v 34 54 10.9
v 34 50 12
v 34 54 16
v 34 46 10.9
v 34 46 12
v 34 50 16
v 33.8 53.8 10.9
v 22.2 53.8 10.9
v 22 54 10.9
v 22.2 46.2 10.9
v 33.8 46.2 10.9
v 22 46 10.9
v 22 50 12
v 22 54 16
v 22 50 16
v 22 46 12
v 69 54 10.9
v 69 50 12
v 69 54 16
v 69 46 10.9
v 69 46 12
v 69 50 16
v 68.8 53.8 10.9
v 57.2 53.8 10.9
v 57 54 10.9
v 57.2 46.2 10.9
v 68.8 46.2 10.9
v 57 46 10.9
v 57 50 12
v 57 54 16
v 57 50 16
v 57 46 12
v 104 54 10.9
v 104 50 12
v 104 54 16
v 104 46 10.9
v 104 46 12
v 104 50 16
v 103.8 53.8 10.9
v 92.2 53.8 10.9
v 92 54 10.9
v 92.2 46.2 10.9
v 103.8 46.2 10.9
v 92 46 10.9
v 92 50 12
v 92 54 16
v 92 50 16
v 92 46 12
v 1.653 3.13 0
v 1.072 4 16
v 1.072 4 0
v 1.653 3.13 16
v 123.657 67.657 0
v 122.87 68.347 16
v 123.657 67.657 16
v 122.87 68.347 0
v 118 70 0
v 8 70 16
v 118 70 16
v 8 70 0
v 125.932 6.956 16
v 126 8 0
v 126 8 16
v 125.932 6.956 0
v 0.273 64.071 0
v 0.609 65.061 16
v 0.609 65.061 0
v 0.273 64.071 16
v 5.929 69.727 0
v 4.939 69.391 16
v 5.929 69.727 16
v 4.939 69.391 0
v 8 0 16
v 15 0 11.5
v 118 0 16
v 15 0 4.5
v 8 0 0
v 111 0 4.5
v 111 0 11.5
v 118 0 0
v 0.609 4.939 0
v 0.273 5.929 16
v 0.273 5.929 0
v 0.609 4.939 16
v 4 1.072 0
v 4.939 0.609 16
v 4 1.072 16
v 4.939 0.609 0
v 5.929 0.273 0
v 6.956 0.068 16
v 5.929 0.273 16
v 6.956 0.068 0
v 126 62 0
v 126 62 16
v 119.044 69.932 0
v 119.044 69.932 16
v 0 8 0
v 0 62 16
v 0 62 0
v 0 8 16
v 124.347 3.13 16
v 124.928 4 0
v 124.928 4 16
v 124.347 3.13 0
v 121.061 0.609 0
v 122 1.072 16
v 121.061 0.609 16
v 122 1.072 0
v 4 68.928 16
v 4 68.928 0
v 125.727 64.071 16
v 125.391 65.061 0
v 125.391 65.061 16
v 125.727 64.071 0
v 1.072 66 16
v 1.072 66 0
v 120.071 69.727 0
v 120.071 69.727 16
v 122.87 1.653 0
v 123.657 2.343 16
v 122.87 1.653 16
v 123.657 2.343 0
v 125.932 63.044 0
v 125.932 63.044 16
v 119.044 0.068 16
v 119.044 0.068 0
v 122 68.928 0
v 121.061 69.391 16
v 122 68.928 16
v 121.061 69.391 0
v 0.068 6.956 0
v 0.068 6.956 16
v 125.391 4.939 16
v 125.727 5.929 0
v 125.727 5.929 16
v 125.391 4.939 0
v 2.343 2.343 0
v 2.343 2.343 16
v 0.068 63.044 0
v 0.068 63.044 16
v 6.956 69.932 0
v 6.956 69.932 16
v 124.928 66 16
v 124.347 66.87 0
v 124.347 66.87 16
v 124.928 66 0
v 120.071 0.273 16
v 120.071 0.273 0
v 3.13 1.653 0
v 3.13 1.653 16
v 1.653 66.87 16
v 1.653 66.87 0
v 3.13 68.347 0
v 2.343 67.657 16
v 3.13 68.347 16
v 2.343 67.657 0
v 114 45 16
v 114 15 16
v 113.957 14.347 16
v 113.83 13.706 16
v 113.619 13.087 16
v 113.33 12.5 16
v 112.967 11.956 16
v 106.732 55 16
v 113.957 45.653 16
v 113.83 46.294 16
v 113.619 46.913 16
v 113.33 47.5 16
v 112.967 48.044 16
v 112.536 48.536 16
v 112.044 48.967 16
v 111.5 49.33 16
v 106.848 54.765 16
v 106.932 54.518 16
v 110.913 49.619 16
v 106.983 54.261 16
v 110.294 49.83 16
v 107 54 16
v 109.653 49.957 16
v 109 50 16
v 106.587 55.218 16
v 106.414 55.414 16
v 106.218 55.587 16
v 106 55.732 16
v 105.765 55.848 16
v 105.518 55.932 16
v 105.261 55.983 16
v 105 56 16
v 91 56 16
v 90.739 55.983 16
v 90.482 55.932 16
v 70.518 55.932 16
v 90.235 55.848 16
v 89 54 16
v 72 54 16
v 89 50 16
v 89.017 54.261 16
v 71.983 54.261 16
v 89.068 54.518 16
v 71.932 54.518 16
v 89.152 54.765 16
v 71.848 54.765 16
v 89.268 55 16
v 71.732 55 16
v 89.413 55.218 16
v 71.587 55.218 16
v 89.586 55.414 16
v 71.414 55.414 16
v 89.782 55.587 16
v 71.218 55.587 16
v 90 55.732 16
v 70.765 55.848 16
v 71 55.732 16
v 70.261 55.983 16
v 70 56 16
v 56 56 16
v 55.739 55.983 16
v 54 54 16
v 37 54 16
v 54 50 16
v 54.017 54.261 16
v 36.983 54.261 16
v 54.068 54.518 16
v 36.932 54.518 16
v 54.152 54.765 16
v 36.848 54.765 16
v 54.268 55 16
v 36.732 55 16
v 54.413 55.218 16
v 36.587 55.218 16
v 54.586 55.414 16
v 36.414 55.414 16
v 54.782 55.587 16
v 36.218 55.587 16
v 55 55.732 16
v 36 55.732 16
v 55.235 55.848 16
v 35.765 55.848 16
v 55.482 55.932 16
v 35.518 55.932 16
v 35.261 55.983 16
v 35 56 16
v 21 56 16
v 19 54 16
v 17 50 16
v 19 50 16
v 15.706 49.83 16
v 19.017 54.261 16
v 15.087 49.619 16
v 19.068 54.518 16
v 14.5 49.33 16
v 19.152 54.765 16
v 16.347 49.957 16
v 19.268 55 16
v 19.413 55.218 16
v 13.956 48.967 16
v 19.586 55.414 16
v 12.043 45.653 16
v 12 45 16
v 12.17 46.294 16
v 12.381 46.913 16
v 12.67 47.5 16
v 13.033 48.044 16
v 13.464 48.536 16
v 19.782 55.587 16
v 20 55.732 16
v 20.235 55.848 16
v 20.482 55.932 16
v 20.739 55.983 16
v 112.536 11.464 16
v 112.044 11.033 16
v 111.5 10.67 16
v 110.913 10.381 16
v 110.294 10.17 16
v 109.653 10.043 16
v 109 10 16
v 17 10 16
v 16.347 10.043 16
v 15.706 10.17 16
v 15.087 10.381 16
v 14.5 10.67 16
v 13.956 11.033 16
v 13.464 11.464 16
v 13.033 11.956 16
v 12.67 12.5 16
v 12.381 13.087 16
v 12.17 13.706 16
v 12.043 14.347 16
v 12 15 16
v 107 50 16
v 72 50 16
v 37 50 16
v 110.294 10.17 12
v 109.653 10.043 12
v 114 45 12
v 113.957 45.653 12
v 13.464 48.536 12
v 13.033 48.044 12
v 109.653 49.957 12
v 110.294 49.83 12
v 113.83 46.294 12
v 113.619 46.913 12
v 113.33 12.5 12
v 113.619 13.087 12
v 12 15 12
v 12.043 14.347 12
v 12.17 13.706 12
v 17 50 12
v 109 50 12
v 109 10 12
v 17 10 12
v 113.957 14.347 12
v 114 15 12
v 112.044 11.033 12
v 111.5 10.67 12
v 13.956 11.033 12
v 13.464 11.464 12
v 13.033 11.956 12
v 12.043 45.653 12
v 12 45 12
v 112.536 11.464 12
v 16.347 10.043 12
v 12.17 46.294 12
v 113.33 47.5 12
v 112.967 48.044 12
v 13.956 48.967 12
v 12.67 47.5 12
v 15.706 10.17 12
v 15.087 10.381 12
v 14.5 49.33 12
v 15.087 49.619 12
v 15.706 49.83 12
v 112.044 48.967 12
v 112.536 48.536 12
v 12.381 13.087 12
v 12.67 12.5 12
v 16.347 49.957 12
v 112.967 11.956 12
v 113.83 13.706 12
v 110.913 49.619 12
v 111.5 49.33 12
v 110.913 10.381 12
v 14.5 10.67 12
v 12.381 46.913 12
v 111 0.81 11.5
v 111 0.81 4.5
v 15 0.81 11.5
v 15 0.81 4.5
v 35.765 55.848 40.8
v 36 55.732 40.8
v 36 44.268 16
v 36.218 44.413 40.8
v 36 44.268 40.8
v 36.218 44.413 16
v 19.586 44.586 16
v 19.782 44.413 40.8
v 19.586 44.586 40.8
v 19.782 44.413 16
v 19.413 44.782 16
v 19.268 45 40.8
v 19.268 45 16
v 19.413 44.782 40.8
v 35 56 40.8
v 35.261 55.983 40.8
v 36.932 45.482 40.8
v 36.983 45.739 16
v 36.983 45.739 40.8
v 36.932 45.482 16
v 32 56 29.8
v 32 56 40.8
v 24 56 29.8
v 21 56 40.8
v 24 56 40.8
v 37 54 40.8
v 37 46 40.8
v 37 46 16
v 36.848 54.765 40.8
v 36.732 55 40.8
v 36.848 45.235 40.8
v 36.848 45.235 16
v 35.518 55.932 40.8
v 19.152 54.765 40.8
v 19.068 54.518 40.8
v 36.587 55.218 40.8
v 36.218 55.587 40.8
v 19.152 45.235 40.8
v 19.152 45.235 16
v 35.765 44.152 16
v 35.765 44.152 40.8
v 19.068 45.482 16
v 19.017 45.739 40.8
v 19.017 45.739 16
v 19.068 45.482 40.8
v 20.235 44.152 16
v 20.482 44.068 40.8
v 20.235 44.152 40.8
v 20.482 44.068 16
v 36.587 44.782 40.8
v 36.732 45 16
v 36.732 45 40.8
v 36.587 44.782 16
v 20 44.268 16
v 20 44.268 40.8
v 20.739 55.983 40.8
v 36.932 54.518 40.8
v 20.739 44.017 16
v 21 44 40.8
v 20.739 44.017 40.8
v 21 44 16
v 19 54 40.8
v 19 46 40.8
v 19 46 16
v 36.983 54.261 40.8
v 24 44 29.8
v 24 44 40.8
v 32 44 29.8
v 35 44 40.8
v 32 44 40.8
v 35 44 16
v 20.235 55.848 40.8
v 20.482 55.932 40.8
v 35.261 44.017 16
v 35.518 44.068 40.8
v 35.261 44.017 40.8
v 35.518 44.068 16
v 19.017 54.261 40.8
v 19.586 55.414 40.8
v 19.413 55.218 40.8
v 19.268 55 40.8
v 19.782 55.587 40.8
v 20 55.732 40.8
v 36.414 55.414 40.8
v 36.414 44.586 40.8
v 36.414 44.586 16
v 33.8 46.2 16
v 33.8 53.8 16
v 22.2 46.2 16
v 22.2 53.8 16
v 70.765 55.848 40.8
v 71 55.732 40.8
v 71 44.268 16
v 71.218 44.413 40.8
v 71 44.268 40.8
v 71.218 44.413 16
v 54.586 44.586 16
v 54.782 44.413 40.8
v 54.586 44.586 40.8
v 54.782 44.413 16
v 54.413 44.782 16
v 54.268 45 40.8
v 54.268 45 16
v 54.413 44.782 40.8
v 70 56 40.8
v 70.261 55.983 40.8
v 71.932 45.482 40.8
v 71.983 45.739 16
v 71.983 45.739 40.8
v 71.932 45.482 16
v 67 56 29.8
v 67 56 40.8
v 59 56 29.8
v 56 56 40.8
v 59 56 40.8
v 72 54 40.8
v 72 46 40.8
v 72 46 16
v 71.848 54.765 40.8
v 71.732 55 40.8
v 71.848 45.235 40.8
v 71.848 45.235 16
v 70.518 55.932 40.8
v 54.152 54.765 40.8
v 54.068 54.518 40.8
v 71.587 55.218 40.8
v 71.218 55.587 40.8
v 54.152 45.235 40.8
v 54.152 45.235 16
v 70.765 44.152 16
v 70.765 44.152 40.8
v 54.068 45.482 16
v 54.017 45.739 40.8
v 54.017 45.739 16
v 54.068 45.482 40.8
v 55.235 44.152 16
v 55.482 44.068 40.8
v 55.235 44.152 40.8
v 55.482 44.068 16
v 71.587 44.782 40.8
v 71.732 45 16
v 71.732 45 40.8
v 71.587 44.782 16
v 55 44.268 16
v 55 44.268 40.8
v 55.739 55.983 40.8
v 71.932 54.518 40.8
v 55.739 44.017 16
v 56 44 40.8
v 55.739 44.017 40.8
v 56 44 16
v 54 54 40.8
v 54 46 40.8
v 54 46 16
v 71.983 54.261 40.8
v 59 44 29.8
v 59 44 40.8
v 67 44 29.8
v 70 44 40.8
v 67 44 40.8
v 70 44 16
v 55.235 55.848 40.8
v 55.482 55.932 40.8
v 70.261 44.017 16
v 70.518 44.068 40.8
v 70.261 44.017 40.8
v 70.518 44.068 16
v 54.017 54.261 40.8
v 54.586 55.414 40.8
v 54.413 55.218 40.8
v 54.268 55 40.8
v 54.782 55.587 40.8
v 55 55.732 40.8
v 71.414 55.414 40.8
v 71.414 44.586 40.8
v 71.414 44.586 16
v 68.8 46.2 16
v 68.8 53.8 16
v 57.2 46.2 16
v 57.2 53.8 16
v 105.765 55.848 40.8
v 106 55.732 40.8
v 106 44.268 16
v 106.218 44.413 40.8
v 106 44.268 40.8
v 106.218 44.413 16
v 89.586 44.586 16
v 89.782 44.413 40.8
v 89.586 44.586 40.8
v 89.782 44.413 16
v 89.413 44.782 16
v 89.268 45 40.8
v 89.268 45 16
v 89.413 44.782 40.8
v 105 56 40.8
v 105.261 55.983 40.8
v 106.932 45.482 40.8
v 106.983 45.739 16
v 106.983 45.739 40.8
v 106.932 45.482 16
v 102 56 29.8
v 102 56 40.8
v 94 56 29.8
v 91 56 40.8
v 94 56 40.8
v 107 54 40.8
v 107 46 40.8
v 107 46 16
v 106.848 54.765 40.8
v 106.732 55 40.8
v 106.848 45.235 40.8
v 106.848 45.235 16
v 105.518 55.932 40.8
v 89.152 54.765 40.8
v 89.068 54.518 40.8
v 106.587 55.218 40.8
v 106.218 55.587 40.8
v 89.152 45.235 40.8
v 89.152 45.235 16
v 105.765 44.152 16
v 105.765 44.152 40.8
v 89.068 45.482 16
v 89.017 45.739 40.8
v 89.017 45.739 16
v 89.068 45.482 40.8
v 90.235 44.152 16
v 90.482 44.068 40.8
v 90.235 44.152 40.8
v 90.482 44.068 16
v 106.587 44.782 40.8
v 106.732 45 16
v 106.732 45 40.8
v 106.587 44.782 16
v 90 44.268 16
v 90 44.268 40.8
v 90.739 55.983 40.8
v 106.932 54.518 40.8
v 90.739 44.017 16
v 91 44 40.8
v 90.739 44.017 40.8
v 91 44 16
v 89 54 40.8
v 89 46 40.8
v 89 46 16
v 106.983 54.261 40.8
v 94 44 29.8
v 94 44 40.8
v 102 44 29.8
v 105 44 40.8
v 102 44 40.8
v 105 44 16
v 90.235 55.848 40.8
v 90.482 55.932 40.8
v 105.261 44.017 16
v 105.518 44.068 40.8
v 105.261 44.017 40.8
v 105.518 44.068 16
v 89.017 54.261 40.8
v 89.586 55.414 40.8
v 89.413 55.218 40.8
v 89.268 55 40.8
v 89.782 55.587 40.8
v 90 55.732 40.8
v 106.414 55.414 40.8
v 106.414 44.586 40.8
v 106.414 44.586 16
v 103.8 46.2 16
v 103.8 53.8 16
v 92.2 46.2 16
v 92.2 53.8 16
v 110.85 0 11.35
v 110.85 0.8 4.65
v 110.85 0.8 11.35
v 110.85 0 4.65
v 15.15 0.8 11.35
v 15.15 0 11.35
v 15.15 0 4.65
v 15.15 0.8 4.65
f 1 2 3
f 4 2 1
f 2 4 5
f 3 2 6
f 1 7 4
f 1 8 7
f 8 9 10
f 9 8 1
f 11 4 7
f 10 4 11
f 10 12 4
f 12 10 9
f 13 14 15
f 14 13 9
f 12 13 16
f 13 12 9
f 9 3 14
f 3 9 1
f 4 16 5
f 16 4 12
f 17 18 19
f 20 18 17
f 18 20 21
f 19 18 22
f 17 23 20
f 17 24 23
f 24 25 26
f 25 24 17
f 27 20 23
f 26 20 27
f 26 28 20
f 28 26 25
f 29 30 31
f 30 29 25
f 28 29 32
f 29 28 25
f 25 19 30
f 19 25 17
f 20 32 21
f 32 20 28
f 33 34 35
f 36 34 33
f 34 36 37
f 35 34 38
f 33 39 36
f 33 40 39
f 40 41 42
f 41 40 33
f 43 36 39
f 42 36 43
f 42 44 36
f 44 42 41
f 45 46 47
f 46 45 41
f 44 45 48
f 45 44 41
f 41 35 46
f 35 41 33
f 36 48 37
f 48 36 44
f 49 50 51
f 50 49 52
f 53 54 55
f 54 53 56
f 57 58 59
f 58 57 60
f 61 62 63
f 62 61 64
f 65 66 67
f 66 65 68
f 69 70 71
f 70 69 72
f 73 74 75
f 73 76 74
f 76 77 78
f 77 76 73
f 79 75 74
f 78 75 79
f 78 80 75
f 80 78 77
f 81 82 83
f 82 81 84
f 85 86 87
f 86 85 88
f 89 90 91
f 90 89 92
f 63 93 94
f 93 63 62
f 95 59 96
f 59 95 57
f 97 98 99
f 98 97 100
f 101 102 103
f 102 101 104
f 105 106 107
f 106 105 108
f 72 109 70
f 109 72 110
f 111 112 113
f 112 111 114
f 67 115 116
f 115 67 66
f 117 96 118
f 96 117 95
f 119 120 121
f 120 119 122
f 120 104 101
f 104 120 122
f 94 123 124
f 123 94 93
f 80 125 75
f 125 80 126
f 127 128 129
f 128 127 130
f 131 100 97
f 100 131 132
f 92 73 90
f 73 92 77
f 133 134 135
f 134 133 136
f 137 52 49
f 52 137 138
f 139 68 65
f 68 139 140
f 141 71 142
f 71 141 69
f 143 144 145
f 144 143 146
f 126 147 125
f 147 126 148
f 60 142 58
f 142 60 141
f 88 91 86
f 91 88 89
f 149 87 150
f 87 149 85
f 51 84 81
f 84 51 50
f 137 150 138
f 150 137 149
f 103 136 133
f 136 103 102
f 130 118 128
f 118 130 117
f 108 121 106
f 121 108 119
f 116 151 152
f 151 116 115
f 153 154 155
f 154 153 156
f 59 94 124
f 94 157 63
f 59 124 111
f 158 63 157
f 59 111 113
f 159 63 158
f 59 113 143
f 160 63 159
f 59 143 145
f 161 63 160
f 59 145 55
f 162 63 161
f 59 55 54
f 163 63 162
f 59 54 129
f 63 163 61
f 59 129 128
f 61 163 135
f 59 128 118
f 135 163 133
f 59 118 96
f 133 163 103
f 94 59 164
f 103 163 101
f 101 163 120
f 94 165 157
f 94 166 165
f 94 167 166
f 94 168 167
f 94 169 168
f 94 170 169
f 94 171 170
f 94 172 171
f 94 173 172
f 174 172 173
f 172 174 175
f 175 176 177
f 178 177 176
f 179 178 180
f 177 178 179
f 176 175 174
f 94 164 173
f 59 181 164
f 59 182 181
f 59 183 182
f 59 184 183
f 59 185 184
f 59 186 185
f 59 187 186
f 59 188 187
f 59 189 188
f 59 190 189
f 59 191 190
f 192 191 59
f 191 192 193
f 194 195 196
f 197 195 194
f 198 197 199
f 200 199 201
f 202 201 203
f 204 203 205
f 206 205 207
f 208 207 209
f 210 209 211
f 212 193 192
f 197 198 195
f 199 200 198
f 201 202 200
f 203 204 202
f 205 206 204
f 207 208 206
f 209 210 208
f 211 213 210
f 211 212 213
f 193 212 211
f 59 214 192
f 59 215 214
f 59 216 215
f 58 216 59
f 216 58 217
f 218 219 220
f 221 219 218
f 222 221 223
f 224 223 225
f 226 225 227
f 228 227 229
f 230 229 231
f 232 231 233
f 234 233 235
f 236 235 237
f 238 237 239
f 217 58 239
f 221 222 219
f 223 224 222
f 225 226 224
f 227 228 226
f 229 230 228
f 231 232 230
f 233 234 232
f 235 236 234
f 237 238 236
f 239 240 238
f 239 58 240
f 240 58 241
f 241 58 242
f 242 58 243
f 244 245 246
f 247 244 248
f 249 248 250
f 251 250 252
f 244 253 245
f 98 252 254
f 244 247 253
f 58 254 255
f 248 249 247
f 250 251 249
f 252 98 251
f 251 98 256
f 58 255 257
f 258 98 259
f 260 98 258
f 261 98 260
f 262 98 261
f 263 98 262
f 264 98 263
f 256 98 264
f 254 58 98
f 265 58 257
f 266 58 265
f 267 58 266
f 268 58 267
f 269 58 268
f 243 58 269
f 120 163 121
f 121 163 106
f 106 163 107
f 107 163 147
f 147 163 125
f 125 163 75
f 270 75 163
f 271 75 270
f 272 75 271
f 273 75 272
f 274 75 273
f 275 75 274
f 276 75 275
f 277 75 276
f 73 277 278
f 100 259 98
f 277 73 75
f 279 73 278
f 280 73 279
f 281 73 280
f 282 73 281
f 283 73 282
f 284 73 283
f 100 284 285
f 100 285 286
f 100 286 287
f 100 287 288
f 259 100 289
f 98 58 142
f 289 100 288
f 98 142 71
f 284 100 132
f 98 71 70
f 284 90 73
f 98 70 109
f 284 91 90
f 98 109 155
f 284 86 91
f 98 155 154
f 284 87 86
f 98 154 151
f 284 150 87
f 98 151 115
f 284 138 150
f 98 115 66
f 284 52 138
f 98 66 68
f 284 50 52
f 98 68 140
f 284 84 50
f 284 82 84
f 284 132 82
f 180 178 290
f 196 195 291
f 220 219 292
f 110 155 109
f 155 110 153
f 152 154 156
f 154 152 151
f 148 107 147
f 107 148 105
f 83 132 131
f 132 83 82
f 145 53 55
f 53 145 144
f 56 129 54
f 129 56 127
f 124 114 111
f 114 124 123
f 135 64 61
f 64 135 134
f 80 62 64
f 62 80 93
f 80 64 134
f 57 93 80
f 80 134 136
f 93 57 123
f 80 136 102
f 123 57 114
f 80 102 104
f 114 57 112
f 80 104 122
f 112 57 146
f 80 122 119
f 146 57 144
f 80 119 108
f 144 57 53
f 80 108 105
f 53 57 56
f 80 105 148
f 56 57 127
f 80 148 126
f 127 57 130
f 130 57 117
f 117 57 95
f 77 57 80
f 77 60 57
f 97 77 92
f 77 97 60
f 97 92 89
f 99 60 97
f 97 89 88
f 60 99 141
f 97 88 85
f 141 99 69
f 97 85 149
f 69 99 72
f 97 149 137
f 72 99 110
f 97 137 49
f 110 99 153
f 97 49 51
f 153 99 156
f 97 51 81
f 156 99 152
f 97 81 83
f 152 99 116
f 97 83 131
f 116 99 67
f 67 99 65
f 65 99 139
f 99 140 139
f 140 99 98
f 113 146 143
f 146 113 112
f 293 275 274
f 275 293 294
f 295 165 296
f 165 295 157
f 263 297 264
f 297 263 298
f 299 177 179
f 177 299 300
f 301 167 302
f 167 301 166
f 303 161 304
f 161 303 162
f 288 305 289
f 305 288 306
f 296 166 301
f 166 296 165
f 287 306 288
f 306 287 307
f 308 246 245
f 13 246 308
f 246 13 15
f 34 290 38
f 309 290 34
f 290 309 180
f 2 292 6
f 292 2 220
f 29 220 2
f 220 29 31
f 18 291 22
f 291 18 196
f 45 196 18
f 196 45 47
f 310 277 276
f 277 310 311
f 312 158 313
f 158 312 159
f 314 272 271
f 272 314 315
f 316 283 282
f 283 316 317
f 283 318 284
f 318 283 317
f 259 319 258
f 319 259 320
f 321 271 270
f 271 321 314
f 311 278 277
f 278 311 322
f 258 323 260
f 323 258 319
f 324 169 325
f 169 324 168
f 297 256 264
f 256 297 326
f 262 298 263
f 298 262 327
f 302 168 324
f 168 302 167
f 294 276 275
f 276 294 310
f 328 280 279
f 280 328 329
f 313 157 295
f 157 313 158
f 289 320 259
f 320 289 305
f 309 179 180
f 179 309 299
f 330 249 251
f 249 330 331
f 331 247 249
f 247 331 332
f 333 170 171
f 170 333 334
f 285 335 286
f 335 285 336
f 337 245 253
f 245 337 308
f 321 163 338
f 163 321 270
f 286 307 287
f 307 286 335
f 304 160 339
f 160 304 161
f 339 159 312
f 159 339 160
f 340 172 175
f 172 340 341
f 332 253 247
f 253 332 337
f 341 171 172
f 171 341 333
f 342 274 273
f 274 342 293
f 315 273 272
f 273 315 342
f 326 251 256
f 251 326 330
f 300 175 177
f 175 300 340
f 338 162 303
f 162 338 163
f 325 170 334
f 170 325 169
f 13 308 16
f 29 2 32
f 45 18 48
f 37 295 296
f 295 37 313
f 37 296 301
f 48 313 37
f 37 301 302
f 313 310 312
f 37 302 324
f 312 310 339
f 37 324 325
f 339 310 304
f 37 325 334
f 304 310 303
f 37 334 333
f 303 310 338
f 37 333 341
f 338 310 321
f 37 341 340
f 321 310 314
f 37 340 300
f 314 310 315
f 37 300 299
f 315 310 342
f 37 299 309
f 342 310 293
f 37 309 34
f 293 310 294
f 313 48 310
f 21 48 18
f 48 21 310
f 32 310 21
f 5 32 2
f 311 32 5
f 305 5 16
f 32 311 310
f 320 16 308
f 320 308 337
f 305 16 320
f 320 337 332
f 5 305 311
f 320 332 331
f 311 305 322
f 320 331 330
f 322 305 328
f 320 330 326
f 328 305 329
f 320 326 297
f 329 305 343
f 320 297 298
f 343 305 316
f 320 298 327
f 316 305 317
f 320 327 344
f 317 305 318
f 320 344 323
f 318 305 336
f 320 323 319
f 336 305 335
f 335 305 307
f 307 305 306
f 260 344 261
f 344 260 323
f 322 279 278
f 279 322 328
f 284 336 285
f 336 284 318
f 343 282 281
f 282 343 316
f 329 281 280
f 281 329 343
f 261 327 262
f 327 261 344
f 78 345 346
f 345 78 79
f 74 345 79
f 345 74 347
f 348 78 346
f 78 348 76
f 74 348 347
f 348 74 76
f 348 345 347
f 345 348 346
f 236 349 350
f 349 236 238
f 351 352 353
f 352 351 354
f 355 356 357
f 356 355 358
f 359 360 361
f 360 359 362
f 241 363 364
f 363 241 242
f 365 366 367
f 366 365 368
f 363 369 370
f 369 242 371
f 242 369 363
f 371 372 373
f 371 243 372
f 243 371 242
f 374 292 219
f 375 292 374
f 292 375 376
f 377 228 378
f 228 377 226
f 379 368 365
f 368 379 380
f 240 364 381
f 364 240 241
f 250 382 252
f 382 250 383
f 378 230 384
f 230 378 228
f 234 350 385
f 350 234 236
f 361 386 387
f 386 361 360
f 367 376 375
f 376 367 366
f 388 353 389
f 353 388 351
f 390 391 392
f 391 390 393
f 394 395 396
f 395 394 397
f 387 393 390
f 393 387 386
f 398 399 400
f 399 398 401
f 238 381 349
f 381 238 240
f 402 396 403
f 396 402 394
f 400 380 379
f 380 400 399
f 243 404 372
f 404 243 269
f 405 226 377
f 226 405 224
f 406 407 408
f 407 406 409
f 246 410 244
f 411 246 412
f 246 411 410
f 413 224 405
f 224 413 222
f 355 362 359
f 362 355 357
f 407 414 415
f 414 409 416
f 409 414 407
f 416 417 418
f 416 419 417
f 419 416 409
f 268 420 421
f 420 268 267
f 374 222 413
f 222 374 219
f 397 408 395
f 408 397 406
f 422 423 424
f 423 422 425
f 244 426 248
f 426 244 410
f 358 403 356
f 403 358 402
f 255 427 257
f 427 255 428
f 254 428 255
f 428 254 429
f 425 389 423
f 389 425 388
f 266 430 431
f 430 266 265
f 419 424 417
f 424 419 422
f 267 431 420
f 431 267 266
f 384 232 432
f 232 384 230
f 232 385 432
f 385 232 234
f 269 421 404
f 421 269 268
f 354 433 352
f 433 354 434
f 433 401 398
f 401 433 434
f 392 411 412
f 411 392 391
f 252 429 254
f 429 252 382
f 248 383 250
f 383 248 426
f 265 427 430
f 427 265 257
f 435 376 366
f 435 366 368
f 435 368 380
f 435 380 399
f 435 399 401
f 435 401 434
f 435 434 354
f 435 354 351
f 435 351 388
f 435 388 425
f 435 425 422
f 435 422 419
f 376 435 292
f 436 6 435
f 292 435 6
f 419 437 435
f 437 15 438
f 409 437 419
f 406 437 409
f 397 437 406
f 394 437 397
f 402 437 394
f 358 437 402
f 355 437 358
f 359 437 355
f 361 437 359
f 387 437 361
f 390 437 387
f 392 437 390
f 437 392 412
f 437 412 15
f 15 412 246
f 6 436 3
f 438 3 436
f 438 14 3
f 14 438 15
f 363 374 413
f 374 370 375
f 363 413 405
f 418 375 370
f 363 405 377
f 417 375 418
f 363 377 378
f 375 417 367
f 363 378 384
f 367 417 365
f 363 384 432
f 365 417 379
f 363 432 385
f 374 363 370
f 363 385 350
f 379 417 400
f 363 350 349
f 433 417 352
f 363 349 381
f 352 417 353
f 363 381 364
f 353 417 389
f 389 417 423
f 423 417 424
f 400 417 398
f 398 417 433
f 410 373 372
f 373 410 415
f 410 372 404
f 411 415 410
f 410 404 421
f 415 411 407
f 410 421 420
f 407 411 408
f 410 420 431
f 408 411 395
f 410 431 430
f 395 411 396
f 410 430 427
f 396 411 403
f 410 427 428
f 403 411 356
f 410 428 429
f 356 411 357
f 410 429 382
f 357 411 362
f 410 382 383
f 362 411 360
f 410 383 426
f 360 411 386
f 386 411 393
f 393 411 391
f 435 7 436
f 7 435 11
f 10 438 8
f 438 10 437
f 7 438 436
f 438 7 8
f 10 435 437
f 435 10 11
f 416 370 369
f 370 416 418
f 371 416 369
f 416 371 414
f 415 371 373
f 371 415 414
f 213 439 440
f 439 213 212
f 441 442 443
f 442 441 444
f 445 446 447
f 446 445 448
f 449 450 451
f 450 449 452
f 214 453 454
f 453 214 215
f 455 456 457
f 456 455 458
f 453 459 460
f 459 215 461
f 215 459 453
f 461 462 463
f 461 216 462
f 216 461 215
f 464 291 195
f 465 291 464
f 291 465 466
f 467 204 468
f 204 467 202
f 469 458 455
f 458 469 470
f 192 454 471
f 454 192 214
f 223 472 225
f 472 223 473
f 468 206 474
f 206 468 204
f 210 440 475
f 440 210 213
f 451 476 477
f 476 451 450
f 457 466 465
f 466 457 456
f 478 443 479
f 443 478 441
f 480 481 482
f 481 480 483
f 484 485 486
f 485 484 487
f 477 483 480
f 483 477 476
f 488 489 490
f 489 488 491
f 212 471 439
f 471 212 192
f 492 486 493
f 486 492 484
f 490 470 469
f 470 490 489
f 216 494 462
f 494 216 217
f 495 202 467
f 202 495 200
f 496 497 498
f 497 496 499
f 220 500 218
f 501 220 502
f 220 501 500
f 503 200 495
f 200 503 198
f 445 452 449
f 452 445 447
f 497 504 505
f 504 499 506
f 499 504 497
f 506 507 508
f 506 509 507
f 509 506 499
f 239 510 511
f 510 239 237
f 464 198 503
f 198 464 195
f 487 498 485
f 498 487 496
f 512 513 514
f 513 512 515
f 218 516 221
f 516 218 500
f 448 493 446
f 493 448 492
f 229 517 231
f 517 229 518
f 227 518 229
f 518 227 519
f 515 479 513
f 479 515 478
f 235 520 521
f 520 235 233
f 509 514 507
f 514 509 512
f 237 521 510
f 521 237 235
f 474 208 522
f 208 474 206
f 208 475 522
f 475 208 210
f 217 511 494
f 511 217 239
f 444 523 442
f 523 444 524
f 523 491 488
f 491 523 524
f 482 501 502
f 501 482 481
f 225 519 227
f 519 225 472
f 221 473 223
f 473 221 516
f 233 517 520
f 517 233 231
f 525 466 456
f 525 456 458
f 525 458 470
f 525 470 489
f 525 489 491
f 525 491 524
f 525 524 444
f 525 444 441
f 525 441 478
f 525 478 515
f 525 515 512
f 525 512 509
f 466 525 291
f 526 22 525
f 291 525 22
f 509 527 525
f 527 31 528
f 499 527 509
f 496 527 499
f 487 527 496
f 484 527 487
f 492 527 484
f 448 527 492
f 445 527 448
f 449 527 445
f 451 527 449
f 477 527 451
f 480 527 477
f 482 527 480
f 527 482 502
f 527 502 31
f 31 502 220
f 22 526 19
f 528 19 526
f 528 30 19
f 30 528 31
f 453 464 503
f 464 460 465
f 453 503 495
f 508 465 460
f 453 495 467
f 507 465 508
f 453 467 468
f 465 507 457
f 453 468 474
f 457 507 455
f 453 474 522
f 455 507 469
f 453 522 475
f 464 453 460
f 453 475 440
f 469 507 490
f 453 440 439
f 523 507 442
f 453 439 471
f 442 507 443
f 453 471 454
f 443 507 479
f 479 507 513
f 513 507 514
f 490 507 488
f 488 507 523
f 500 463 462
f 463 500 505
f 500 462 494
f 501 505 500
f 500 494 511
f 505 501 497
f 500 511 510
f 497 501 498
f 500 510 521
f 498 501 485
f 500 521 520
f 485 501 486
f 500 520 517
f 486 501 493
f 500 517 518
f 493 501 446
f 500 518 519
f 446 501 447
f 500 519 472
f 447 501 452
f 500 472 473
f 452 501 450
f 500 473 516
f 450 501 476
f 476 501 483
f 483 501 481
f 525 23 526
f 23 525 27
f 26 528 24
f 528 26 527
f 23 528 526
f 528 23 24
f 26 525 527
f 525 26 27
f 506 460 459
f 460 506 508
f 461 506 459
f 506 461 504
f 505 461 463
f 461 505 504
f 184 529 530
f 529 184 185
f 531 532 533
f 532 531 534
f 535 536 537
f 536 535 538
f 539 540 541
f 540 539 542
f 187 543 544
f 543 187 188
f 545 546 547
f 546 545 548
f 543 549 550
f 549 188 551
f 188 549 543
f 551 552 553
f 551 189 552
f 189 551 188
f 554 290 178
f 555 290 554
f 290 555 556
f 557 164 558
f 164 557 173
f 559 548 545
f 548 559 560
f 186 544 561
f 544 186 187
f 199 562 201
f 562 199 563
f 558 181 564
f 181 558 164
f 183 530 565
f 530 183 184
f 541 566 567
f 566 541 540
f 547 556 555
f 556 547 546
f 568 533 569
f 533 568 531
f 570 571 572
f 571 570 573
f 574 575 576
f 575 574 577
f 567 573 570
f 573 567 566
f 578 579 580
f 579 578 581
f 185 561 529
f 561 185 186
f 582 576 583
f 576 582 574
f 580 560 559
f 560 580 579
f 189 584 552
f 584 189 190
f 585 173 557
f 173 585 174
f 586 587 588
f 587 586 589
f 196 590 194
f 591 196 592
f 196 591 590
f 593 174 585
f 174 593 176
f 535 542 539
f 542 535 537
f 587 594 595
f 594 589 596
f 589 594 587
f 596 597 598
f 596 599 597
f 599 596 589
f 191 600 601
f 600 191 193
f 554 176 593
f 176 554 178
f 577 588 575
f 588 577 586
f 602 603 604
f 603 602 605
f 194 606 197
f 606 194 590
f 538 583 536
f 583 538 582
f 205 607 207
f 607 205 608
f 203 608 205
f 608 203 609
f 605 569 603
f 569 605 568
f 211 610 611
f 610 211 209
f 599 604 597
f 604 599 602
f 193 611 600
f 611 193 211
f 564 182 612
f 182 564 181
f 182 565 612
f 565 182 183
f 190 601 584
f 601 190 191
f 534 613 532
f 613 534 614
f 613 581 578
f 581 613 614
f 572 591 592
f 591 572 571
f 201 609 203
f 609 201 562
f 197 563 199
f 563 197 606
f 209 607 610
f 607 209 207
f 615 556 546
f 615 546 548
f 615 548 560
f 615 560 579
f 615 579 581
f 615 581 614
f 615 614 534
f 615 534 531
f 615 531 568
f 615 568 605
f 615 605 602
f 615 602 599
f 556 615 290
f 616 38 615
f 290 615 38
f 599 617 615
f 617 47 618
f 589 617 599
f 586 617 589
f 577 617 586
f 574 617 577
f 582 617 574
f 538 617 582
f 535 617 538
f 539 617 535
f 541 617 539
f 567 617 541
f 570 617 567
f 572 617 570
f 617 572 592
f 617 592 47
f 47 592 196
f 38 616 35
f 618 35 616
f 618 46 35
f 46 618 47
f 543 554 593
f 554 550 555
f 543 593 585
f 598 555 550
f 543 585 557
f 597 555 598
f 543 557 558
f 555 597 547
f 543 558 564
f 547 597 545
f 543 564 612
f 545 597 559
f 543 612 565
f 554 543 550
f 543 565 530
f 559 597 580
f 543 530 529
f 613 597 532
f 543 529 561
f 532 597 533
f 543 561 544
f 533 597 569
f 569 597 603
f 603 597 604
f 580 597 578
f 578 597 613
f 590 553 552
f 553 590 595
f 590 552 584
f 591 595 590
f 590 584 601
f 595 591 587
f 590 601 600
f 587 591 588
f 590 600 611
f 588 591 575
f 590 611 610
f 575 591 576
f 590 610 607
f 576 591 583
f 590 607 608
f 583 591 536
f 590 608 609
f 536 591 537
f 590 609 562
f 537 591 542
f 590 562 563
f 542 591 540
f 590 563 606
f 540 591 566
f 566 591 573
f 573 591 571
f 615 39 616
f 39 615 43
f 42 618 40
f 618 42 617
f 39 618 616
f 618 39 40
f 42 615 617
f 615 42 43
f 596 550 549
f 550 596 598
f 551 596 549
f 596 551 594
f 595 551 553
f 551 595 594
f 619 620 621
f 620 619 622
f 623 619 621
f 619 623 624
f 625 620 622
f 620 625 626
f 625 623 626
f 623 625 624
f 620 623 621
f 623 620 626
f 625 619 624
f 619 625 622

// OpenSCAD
/*
  Robinson PrintWorks Cable Dock V1
  A no-support desktop dock for three charging/data cables.

  Print the base in Deep Royal Blue and the clips/inlay in Bright Cyan.
  Select the part to export by changing `part` below.
*/

$fn = 48;

part = "assembly"; // "base", "clip", "inlay", or "assembly"

// Shared product-family dimensions (millimeters)
base_width = 126;
base_depth = 70;
base_height = 16;
base_radius = 8;

clip_width = 18;
clip_depth = 12;
clip_height = 30;
clip_peg_width = 11.6;
clip_peg_depth = 7.6;
clip_peg_height = 5.2;
cable_slot_width = 8;

inlay_width = 96;
inlay_height = 7;
inlay_thickness = 0.8;

clip_positions = [28, 63, 98];

module rounded_box(width, depth, height, radius) {
  hull() {
    for (x = [radius, width - radius]) {
      for (y = [radius, depth - radius]) {
        translate([x, y, 0]) cylinder(h = height, r = radius);
      }
    }
  }
}

module base() {
  difference() {
    rounded_box(base_width, base_depth, base_height, base_radius);

    // Shallow top tray: catches loose ends and gives the piece a lighter profile.
    translate([12, 10, 12])
      rounded_box(base_width - 24, base_depth - 30, 4.1, 5);

    // Front recess for the separate cyan inlay.
    translate([(base_width - inlay_width) / 2, -0.01, 4.5])
      cube([inlay_width, inlay_thickness + 0.02, inlay_height]);

    // Peg slots for the three removable cable clips.
    for (x = clip_positions) {
      translate([x - (clip_peg_width + 0.4) / 2, 50 - (clip_peg_depth + 0.4) / 2, base_height - 5.1])
        cube([clip_peg_width + 0.4, clip_peg_depth + 0.4, 5.2]);
    }
  }
}

module clip() {
  difference() {
    union() {
      // A stable, slightly rounded upright cable guide.
      translate([0, 0, clip_peg_height])
        rounded_box(clip_width, clip_depth, clip_height - clip_peg_height, 2);

      // Peg is intentionally 0.2 mm undersized per side for a press fit.
      translate([(clip_width - clip_peg_width) / 2, (clip_depth - clip_peg_depth) / 2, 0])
        cube([clip_peg_width, clip_peg_depth, clip_peg_height + 0.2]);
    }

    // Top-open U channel: supports cables about 5–7 mm in diameter.
    translate([(clip_width - cable_slot_width) / 2, -0.1, 19])
      cube([cable_slot_width, clip_depth + 0.2, clip_height]);
  }
}

module inlay() {
  // Plain insert: add an embossed RPW mark later after testing the fit.
  cube([inlay_width - 0.3, inlay_thickness, inlay_height - 0.3]);
}

module assembly() {
  color("#073B78") base();

  for (x = clip_positions) {
    color("#22D3EE")
      translate([x - clip_width / 2, 50 - clip_depth / 2, base_height - clip_peg_height])
        clip();
  }

  color("#22D3EE")
    translate([(base_width - inlay_width) / 2 + 0.15, 0, 4.65])
      inlay();
}

if (part == "base") {
  base();
} else if (part == "clip") {
  clip();
} else if (part == "inlay") {
  inlay();
} else {
  assembly();
}
